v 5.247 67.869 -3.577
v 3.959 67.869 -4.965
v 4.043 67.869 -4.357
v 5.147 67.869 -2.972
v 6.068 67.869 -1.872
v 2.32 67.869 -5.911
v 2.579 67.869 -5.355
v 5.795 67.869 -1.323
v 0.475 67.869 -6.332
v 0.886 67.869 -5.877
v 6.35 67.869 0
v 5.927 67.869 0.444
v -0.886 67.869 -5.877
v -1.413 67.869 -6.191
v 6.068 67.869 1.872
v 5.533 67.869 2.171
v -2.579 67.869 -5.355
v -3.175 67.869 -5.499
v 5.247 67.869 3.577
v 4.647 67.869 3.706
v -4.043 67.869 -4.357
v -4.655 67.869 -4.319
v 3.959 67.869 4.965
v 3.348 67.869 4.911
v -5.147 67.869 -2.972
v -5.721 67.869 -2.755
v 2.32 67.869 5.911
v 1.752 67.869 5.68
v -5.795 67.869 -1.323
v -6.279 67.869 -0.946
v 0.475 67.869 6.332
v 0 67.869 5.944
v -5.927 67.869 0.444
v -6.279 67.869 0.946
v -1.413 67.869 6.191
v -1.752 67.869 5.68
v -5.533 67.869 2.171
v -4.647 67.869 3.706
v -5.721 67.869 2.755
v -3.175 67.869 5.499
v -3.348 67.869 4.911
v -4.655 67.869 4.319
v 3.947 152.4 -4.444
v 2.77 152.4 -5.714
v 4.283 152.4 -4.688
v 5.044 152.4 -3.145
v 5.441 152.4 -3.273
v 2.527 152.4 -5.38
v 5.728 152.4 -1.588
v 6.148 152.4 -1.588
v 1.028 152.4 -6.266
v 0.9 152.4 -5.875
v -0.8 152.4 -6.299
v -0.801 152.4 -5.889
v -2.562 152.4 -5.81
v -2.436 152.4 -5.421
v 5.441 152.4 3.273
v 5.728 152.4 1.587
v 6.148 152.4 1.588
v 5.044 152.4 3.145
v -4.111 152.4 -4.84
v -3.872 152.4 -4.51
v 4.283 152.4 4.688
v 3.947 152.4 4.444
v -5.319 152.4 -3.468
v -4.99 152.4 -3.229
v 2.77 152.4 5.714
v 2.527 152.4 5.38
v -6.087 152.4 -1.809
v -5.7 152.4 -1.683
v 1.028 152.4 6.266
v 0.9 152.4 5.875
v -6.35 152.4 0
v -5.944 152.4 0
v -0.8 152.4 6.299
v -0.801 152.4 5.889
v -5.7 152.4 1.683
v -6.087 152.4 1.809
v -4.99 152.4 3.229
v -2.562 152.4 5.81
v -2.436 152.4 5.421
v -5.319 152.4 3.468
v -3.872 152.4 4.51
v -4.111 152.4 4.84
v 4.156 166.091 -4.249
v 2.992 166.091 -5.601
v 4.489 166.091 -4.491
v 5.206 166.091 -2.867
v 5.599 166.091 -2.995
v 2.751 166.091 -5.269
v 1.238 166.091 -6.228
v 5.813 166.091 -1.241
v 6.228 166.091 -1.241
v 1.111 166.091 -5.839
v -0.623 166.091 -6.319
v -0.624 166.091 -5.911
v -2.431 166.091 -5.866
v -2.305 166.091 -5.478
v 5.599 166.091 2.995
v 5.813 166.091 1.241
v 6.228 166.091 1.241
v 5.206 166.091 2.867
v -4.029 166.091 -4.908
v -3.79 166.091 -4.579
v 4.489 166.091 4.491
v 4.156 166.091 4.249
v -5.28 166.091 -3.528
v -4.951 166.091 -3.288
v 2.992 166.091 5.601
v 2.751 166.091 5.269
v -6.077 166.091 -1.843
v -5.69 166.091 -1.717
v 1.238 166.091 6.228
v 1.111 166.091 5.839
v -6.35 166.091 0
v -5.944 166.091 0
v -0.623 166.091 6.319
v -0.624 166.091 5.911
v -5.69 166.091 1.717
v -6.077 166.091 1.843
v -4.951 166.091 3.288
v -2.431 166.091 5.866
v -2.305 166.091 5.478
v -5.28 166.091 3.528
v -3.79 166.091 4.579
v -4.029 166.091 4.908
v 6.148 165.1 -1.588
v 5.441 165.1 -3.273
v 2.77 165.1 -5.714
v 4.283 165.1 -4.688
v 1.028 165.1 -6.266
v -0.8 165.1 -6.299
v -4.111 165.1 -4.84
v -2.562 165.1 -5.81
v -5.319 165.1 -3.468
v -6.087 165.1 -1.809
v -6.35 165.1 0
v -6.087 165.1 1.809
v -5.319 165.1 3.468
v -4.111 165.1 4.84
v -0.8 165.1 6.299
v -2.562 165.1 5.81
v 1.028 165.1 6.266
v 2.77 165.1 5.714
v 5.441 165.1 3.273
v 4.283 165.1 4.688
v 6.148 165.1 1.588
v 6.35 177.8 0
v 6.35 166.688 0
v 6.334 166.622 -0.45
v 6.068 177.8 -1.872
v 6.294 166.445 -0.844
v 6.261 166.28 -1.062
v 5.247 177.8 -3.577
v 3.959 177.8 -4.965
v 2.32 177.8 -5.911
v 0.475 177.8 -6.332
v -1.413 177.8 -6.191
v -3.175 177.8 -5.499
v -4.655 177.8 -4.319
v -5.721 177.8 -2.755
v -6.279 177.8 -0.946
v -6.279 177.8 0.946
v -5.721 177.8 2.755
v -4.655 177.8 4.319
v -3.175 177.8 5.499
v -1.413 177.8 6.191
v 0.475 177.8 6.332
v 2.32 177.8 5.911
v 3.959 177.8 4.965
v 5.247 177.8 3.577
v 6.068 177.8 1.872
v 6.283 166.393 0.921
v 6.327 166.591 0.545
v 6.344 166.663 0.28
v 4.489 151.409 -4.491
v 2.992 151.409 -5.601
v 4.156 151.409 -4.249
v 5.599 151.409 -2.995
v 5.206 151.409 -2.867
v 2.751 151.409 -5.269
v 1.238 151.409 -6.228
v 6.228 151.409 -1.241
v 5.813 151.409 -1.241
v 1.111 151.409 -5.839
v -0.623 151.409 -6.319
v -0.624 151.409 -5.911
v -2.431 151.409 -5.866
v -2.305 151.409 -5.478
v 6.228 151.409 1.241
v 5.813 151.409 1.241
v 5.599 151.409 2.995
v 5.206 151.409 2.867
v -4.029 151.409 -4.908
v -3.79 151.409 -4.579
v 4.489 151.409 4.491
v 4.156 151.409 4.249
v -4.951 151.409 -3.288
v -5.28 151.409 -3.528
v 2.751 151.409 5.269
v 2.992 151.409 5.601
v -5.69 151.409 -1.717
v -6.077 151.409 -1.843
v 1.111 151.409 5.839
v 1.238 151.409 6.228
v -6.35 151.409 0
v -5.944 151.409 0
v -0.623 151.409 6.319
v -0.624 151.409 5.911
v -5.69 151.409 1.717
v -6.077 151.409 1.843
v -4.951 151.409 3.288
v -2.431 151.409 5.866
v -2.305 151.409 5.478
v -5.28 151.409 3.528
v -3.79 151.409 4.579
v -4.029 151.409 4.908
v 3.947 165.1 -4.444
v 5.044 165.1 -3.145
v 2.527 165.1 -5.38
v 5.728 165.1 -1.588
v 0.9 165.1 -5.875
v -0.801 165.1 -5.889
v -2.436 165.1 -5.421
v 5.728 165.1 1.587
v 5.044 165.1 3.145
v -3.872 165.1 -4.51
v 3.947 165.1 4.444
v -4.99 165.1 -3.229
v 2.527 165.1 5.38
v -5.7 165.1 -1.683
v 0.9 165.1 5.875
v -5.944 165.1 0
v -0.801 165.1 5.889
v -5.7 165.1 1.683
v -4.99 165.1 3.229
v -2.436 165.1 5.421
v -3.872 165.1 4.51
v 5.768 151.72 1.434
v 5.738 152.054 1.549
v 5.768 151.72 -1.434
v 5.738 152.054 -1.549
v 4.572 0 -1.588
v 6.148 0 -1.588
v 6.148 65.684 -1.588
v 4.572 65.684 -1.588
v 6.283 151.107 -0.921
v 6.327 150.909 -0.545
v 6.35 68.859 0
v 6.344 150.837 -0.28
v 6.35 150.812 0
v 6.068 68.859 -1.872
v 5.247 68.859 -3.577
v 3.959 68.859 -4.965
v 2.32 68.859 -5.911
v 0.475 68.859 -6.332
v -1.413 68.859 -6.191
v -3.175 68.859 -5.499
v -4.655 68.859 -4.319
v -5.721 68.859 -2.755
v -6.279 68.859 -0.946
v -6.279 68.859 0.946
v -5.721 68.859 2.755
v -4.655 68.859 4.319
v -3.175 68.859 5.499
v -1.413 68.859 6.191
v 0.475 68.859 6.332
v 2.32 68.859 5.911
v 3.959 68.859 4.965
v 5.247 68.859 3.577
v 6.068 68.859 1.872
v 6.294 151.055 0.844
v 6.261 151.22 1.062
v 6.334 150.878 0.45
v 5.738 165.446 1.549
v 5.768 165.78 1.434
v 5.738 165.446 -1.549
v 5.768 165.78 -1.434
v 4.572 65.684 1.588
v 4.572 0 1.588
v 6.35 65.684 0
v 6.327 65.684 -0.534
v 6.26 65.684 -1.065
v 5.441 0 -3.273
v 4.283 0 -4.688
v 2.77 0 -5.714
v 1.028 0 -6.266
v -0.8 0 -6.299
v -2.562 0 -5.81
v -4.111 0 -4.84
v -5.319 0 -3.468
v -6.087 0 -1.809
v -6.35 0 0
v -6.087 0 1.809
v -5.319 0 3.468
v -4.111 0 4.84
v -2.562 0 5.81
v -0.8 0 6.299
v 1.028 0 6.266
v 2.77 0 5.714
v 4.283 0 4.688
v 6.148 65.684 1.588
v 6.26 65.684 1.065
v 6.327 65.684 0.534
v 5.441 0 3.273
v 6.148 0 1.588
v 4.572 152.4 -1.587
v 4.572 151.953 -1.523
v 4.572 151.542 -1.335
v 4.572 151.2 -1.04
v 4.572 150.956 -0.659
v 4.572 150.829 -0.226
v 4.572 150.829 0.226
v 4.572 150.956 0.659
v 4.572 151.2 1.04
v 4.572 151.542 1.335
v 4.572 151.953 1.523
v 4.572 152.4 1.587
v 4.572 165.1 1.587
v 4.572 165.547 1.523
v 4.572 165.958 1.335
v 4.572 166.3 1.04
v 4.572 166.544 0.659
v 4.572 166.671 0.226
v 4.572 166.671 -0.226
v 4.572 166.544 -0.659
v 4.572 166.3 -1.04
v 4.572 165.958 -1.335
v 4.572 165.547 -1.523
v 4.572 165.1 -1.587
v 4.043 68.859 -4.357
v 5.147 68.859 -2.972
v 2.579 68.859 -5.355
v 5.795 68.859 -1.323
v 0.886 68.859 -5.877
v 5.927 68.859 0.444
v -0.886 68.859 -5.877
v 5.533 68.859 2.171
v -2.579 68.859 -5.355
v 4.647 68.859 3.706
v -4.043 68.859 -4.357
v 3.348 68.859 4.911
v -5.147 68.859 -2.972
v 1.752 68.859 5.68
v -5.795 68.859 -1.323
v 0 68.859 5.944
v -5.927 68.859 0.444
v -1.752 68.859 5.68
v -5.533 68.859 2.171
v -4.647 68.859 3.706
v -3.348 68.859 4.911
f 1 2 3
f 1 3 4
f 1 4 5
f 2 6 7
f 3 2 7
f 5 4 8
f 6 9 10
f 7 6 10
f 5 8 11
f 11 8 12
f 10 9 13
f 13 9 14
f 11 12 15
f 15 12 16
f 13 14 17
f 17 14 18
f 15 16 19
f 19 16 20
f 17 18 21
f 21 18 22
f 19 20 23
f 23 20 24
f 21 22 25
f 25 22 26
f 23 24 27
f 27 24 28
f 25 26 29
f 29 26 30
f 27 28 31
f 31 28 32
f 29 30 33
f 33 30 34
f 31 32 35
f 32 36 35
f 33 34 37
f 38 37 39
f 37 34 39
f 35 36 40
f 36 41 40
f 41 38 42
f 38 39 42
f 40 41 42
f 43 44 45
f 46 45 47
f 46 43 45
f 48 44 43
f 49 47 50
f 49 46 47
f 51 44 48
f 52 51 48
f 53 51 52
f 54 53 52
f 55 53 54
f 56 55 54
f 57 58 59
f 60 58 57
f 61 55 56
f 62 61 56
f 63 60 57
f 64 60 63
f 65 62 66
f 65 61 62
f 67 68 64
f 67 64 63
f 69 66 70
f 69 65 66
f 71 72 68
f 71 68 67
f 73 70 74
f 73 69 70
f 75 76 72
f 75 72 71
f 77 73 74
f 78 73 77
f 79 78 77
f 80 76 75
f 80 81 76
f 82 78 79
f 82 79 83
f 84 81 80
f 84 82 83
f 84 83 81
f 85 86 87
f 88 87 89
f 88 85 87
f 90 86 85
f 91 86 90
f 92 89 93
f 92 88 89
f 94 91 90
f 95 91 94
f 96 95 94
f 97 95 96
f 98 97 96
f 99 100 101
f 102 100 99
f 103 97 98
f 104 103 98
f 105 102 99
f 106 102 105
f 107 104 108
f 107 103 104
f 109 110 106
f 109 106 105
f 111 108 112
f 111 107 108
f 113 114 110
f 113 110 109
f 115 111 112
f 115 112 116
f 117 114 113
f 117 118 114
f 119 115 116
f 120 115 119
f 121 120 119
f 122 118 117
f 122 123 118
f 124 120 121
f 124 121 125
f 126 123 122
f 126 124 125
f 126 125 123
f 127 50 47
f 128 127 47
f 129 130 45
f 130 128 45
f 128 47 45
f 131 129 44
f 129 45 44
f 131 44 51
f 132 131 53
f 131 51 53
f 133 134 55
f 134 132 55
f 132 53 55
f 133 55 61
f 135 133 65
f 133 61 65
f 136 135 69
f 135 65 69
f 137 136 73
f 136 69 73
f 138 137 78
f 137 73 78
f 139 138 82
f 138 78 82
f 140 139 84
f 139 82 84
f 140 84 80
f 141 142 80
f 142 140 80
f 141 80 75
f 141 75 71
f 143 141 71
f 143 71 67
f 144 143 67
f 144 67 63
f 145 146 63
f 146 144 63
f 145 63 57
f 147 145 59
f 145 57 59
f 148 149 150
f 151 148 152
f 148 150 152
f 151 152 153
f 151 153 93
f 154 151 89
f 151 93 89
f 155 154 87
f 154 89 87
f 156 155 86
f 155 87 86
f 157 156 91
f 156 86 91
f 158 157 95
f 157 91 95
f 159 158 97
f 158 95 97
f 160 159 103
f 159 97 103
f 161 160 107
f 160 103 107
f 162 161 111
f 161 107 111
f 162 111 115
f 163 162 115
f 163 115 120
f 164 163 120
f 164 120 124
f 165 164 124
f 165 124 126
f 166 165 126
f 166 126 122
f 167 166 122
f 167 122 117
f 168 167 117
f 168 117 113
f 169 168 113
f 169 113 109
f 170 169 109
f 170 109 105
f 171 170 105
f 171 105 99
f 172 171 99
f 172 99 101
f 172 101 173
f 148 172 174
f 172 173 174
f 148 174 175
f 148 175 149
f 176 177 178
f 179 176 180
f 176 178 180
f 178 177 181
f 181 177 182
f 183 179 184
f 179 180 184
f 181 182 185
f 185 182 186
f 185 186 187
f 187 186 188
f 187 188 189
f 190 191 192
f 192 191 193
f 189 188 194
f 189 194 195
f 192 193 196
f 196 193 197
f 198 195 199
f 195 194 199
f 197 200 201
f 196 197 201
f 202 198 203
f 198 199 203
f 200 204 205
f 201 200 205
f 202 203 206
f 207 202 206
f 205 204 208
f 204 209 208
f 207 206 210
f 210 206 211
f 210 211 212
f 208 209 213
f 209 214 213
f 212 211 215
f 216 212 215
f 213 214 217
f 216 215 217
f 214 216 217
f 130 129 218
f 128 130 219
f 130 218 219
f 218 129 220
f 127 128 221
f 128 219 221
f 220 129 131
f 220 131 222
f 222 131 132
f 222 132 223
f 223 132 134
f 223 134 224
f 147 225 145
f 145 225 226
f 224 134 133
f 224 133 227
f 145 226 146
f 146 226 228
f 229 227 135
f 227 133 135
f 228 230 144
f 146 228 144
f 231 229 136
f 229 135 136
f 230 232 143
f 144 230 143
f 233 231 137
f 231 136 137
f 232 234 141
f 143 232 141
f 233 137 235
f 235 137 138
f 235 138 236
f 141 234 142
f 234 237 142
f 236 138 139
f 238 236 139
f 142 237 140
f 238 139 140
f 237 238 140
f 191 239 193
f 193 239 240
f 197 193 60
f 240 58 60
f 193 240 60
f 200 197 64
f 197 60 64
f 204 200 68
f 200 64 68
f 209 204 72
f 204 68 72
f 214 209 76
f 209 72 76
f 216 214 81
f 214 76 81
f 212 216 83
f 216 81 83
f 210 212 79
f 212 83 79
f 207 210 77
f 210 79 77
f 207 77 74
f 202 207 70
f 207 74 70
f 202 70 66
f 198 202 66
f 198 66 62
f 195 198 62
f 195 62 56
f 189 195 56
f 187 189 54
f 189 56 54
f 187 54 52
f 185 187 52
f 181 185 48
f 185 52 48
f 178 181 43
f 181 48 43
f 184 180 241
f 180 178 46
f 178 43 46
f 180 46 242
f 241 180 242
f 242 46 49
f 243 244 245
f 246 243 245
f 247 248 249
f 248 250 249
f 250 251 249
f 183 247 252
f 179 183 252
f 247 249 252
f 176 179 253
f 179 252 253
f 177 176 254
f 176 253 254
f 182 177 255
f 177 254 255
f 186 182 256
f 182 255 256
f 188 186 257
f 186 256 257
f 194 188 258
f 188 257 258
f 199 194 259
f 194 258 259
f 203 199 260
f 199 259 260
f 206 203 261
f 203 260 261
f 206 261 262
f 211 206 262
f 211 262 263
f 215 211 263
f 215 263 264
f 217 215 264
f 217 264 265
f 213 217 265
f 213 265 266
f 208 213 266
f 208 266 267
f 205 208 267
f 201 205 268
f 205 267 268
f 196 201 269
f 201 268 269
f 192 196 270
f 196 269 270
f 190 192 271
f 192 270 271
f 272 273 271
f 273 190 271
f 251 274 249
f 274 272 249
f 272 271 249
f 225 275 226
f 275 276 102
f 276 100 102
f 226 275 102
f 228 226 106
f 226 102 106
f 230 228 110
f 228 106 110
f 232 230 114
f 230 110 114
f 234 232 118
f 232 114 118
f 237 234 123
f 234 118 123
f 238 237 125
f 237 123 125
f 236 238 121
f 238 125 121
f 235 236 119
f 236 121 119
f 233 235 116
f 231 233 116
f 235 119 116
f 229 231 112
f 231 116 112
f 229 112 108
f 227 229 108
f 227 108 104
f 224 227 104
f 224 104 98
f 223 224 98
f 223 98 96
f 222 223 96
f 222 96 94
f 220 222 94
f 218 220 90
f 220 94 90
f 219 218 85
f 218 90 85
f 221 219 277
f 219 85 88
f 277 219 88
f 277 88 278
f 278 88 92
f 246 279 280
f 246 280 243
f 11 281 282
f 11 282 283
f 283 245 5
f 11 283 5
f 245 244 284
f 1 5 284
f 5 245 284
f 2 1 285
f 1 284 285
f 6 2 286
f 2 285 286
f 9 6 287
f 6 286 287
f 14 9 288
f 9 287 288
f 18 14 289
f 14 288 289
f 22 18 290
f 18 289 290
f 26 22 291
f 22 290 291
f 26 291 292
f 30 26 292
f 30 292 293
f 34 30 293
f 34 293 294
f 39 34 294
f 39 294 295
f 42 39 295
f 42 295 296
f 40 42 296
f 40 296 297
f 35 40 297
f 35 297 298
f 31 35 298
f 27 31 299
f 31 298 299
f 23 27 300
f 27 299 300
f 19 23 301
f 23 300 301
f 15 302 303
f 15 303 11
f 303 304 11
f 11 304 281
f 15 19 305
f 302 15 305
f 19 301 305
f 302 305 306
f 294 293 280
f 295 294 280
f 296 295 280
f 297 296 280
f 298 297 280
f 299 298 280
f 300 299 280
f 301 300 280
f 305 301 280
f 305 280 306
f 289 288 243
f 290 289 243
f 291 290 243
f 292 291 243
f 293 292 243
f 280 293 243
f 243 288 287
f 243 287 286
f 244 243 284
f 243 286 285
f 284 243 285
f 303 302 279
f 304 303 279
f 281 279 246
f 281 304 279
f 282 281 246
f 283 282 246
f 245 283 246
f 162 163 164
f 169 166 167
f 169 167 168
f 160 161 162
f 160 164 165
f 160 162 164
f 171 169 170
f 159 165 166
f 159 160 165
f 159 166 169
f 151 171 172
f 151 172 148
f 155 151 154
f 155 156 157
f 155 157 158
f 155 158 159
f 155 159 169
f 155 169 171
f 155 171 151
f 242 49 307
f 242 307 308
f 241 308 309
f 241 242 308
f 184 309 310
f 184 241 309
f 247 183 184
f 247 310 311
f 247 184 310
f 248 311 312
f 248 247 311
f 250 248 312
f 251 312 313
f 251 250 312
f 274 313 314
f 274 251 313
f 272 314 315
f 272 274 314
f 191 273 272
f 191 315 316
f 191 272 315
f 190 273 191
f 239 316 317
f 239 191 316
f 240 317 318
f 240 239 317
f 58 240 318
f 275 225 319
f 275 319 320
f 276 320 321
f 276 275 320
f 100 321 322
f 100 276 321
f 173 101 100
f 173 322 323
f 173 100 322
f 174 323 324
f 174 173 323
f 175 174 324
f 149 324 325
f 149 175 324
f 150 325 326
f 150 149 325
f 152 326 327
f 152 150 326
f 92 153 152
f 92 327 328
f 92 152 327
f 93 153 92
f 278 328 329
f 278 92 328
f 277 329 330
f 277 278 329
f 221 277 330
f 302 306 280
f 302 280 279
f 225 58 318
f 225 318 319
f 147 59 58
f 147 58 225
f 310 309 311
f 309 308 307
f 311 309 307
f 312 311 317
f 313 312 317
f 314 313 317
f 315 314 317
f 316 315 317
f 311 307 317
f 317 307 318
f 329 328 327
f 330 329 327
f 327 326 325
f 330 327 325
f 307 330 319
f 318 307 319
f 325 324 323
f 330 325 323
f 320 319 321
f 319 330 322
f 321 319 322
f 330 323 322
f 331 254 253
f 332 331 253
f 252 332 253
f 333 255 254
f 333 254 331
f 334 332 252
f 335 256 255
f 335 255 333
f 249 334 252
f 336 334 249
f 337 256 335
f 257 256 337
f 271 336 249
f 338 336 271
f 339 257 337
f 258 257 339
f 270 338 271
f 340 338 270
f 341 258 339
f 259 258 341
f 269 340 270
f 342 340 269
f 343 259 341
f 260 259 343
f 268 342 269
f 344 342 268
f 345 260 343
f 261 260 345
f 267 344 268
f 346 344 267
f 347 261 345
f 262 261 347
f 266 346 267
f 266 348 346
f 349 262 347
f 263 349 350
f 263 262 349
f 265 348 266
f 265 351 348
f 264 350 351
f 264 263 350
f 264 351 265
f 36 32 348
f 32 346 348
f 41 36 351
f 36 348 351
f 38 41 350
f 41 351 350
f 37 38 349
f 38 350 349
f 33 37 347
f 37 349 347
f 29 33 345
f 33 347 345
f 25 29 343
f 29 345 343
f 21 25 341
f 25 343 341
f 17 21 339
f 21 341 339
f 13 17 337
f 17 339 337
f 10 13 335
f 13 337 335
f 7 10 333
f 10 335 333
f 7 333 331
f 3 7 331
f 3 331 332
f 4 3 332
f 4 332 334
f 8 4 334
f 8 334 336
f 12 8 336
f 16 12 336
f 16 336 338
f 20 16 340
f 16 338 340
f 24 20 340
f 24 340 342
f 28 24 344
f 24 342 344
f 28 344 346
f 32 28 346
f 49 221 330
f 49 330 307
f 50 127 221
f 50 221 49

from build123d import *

# Parameters (mm, degrees)
SKETCH1_R           = 6.35
BOSS_EXTRUDE1_DEPTH = 177.8
SKETCH2_W           = 38.97891716
SKETCH2_H           = 0.9906
SKETCH3_W           = 26.12692973
SKETCH3_H           = 0.9906
SKETCH4_W           = 46.050080865
SKETCH4_H           = 0.9906
CUT_EXTRUDE1_DEPTH  = 1.778
SKETCH6_W           = 3.175
SKETCH6_H           = 80.766552272
CUT_EXTRUDE2_DEPTH  = 1.778


with BuildPart() as part:
    # Sketch1 → Boss-Extrude1 (new body)
    with BuildSketch(Plane(origin=(0, 0, 0), x_dir=(1, 0, 0), z_dir=(0, 1, 0))):
        Circle(SKETCH1_R)
    extrude(amount=BOSS_EXTRUDE1_DEPTH)

    # Sketch2 → Cut-Revolve1 (revolve, cut)
    with BuildSketch(Plane(origin=(0, 0, 0), x_dir=(0, 0, -1), z_dir=(1, 0, 0))):
        with Locations((-25.43305858, 165.5953)):
            Rectangle(SKETCH2_W, SKETCH2_H)
    revolve(axis=Axis((0, 174.664052397, 0), (0, -1, 0)), mode=Mode.SUBTRACT)

    # Sketch3 → Cut-Revolve2 (revolve, cut)
    with BuildSketch(Plane(origin=(0, 0, 0), x_dir=(0, 0, -1), z_dir=(1, 0, 0))):
        with Locations((-19.007064865, 151.9047)):
            Rectangle(SKETCH3_W, SKETCH3_H)
    revolve(axis=Axis((0, 162.013911259, 0), (0, -1, 0)), mode=Mode.SUBTRACT)

    # Sketch4 → Cut-Revolve3 (revolve, cut)
    with BuildSketch(Plane(origin=(0, 0, 0), x_dir=(0, 0, -1), z_dir=(1, 0, 0))):
        with Locations((-28.968640433, 68.3641)):
            Rectangle(SKETCH4_W, SKETCH4_H)
    revolve(axis=Axis((0, 70.295355643, 0), (0, -1, 0)), mode=Mode.SUBTRACT)

    # Sketch5 → Cut-Extrude1 (cut)
    with BuildSketch(Plane(origin=(6.35, 0, 0), x_dir=(0, 0, -1), z_dir=(1, 0, 0))):
        with BuildLine():
            Line((1.5875, 165.1), (1.5875, 152.4))
            ThreePointArc((1.5875, 152.4), (0, 150.8125), (-1.5875, 152.4))
            Line((-1.5875, 152.4), (-1.5875, 165.1))
            ThreePointArc((-1.5875, 165.1), (0, 166.6875), (1.5875, 165.1))
        make_face()
    extrude(amount=-CUT_EXTRUDE1_DEPTH, mode=Mode.SUBTRACT)

    # Sketch6 → Cut-Extrude2 (cut)
    with BuildSketch(Plane(origin=(6.35, 0, 0), x_dir=(0, 0, -1), z_dir=(1, 0, 0))):
        with Locations((0, 25.301123864)):
            Rectangle(SKETCH6_W, SKETCH6_H)
    extrude(amount=-CUT_EXTRUDE2_DEPTH, mode=Mode.SUBTRACT)


solid = part.part
